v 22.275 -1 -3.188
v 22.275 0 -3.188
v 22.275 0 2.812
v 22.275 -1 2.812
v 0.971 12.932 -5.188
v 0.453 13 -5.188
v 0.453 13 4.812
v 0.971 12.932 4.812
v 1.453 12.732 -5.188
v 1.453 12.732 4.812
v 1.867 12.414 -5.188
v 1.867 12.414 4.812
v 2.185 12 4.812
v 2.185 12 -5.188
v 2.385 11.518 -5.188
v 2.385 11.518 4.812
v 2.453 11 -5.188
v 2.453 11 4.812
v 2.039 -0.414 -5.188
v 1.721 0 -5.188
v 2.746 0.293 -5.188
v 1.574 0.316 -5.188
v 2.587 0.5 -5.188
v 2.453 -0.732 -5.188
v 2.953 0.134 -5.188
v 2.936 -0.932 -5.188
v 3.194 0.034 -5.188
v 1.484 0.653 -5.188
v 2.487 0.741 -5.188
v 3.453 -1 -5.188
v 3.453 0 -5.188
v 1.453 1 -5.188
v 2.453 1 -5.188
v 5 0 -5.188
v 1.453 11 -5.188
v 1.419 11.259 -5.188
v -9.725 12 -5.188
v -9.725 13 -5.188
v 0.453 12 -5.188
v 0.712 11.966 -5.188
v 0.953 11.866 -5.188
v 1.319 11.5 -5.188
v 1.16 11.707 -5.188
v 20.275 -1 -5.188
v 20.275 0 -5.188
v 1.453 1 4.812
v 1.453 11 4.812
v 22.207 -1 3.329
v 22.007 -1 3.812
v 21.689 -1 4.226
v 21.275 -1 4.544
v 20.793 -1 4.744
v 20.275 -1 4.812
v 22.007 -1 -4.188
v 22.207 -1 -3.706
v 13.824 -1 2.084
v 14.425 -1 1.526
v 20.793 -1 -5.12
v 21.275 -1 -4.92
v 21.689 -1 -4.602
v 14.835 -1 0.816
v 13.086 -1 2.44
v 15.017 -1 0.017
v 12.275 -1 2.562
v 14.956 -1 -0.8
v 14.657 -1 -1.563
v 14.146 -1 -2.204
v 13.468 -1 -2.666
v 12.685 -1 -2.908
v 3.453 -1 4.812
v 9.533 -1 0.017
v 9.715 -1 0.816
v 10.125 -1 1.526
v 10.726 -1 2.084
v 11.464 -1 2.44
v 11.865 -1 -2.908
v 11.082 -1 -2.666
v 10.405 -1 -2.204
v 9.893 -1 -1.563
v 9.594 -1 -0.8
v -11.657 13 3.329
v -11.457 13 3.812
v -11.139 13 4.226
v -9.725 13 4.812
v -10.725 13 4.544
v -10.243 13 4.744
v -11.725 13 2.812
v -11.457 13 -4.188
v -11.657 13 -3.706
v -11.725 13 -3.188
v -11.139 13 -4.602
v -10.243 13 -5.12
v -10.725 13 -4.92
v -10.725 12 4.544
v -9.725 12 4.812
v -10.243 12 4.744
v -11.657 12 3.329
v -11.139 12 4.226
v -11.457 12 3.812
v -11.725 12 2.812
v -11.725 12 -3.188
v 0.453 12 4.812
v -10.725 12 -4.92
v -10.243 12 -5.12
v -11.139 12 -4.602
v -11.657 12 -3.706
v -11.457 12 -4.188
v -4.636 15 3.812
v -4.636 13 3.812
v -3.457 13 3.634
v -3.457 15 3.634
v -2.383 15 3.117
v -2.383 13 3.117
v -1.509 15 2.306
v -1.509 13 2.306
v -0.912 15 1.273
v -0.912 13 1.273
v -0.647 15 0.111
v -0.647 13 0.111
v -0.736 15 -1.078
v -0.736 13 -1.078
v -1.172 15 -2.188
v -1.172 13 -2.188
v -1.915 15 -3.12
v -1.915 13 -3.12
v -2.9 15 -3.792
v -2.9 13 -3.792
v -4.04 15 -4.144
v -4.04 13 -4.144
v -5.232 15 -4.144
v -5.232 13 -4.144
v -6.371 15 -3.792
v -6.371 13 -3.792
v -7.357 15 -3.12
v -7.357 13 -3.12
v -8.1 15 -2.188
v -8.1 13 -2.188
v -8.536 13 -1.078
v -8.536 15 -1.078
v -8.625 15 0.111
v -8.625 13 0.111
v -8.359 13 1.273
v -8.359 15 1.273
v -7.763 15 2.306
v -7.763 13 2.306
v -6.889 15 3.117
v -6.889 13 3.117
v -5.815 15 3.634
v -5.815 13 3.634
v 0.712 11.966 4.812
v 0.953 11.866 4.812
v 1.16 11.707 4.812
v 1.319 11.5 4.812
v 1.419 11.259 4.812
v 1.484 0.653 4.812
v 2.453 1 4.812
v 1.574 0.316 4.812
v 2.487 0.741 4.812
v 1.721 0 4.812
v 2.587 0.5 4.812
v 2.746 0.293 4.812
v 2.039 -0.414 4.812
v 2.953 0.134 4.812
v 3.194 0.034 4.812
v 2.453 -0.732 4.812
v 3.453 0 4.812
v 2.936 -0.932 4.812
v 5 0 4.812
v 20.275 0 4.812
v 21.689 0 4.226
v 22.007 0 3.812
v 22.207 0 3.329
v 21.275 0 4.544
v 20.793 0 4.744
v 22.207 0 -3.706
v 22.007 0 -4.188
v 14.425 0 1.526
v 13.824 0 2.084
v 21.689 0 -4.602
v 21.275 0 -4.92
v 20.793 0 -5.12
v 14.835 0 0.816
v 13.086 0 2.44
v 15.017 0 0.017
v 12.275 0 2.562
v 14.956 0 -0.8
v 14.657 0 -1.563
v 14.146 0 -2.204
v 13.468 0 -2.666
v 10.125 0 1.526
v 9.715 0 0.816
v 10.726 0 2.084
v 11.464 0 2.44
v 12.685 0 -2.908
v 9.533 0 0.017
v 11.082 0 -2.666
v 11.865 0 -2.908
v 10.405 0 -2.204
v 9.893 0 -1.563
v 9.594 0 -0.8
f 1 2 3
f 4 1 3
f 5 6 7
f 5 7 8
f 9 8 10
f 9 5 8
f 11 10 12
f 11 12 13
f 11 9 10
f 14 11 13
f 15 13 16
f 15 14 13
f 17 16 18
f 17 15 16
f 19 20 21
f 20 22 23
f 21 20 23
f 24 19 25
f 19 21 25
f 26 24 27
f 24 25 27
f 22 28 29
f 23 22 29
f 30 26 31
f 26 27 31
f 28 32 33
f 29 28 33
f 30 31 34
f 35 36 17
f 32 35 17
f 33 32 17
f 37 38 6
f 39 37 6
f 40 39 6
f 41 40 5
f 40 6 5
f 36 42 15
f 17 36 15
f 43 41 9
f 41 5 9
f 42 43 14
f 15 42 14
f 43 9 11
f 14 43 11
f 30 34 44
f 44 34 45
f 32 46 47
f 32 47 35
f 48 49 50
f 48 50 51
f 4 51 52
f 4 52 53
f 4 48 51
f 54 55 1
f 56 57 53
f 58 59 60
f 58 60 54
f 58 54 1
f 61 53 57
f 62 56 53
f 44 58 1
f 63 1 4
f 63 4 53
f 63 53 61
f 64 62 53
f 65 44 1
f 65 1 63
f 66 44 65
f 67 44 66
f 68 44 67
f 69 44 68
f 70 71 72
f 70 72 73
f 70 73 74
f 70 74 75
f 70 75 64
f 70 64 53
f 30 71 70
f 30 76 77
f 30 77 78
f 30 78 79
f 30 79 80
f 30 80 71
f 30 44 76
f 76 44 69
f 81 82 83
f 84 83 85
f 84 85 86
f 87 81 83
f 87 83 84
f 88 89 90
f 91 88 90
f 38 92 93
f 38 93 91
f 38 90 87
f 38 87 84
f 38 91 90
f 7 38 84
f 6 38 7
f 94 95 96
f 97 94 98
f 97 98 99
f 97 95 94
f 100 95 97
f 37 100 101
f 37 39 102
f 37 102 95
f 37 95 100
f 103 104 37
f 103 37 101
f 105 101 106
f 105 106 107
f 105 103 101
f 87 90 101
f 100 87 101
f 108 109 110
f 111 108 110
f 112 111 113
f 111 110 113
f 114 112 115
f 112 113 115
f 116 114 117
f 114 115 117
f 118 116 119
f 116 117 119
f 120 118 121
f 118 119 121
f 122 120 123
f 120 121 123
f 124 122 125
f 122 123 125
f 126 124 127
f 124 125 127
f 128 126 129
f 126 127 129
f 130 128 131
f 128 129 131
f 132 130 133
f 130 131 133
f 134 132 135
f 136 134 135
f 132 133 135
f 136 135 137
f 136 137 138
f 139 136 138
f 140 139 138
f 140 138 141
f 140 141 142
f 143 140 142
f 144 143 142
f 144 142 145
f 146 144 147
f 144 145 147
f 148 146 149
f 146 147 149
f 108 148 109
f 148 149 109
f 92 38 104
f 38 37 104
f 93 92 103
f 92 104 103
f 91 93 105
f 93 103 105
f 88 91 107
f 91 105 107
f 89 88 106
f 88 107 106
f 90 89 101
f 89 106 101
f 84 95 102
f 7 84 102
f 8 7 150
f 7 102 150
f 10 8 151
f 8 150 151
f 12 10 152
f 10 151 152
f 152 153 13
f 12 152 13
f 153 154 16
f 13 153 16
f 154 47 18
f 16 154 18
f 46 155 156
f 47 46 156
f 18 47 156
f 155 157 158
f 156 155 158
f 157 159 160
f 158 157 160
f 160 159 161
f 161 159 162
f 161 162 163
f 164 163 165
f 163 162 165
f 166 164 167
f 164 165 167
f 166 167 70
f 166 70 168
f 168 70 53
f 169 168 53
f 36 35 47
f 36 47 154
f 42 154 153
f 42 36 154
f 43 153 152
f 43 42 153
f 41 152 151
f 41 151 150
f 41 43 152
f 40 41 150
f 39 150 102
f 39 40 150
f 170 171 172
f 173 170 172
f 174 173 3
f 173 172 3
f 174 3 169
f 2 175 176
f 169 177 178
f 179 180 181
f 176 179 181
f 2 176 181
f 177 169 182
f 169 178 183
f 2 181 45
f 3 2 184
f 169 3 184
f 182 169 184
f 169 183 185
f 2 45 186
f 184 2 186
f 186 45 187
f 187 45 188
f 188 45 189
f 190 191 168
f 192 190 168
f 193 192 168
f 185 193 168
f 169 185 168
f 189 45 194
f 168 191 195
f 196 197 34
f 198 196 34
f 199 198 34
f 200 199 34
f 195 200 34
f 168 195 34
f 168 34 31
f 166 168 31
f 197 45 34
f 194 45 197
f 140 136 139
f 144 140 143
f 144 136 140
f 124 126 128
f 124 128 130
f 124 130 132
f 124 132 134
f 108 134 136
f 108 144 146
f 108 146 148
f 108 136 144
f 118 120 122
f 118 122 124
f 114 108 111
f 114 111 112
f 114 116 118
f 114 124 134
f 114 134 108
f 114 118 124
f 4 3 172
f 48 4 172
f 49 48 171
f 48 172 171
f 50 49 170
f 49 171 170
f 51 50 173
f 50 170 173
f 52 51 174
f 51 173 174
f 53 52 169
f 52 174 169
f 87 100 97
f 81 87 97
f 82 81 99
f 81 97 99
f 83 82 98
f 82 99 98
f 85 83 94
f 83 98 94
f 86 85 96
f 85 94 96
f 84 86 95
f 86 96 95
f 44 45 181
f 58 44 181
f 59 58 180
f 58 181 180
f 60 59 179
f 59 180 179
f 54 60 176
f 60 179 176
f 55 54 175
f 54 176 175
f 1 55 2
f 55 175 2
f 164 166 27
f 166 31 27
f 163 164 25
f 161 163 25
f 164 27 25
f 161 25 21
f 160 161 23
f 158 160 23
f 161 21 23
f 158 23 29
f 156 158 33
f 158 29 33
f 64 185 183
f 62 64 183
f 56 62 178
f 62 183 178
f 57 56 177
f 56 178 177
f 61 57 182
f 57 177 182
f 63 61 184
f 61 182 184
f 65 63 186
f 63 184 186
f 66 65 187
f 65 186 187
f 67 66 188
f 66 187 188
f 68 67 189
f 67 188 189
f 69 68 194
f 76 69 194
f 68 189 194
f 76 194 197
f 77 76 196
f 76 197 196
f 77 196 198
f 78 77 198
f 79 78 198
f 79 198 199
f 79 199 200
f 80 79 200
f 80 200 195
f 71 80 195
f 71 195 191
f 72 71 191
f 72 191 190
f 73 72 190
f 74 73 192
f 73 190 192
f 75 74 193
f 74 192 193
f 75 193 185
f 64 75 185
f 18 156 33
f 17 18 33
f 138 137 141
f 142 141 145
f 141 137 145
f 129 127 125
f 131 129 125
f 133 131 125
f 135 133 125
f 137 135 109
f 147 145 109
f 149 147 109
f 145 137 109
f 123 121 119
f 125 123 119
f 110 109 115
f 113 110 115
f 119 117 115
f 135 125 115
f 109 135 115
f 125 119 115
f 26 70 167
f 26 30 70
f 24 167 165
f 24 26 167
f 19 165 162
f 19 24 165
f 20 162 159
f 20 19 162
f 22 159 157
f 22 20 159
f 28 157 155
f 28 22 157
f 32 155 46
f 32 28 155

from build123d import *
from build123d.topology import SkipClean

# Parameters (mm, degrees)
SKETCH1_R           = 2.75
BASE_FLANGE1_DEPTH  = 1
JOG1_START          = -5.188227046
JOG1_DEPTH          = 10
JOG1_START_2        = -3.188227046
JOG1_2_DEPTH        = 6
JOG1_START_3        = 11
JOG1_3_DEPTH        = 1.974011807
JOG1_4_OUTLINE_W    = 1
JOG1_4_OUTLINE_H    = 2
JOG1_4_DEPTH        = 11.152182036
JOG1_START_4        = 12
JOG1_5_DEPTH        = 1
JOG1_6_DEPTH        = 10
JOG1_7_DEPTH        = 10
SKETCH7_R           = 4
BOSS_EXTRUDE2_DEPTH = 2


with BuildPart() as part:
    # Base-Flange1: sheet metal written as solids
    # Sketch1 → Base-Flange1 (new body)
    with BuildSketch(Plane(origin=(0, 0, 0), x_dir=(1, 0, 0), z_dir=(0, 1, 0))):
        with BuildLine():
            Line((-9.72493422, 5.188227046), (20.27506578, 5.188227046))
            ThreePointArc((20.27506578, 5.188227046), (21.689279343, 4.602440608), (22.27506578, 3.188227046))
            Line((22.27506578, 3.188227046), (22.27506578, -2.811772954))
            ThreePointArc((22.27506578, -2.811772954), (21.689279343, -4.225986516), (20.27506578, -4.811772954))
            Line((20.27506578, -4.811772954), (-9.72493422, -4.811772954))
            ThreePointArc((-9.72493422, -4.811772954), (-11.139147782, -4.225986516), (-11.72493422, -2.811772954))
            Line((-11.72493422, -2.811772954), (-11.72493422, 3.188227046))
            ThreePointArc((-11.72493422, 3.188227046), (-11.139147782, 4.602440608), (-9.72493422, 5.188227046))
        make_face()
        with Locations(Location((12.27506578, 0.188227046, 0), (0, 0, 270))):
            Circle(SKETCH1_R, mode=Mode.SUBTRACT)
    extrude(amount=-BASE_FLANGE1_DEPTH)

    # Jog1: read off the stored shape, not the designer's step
    # Jog1 outline → Jog1 (cut)
    with BuildSketch(Plane.XY.offset(JOG1_START)):
        with BuildLine():
            ThreePointArc((3.453163025, -1), (2.453163025, -0.732050807), (1.721112218, 0))
            Line((1.721112218, 0), (-11.72493422, 0))
            Line((-11.72493422, 0), (-11.72493422, -1))
            Line((-11.72493422, -1), (3.453163025, -1))
        make_face()
    extrude(amount=JOG1_DEPTH, mode=Mode.SUBTRACT)

    # Jog1 2 outline → Jog1 2 (add)
    with BuildSketch(Plane.XY.offset(JOG1_START_2)):
        with BuildLine():
            Line((1.453163025, 11), (1.453163025, 1))
            ThreePointArc((1.453163025, 1), (1.521311373, 0.48236191), (1.721112218, 0))
            Line((1.721112218, 0), (3.453163025, 0))
            ThreePointArc((3.453163025, 0), (2.746056244, 0.292893219), (2.453163025, 1))
            Line((2.453163025, 1), (2.453163025, 11))
            ThreePointArc((2.453163025, 11), (1.867376588, 12.414213563), (0.453163025, 13))
            Line((0.453163025, 13), (-11.72493422, 13))
            Line((-11.72493422, 13), (-11.72493422, 12))
            Line((-11.72493422, 12), (0.453163025, 12))
            ThreePointArc((0.453163025, 12), (1.160269807, 11.707106782), (1.453163025, 11))
        make_face()
    extrude(amount=JOG1_2_DEPTH)

    # Jog1 3 outline → Jog1 3 (add)
    with BuildSketch(Plane(origin=(0, 0, 0), x_dir=(1, 0, 0), z_dir=(0, 1, 0)).offset(JOG1_START_3)):
        with BuildLine():
            Line((2.453163025, -4.811772954), (2.453163025, -2.811772954))
            Line((2.453163025, -2.811772954), (-11.72493422, -2.811772954))
            ThreePointArc((-11.72493422, -2.811772954), (-11.139147782, -4.225986516), (-9.72493422, -4.811772954))
            Line((-9.72493422, -4.811772954), (2.453163025, -4.811772954))
        make_face()
        with BuildLine():
            Line((-11.72493422, 3.188227046), (2.453163025, 3.188227046))
            Line((2.453163025, 3.188227046), (2.453163025, 5.188227046))
            Line((2.453163025, 5.188227046), (-9.72493422, 5.188227046))
            ThreePointArc((-9.72493422, 5.188227046), (-11.139147782, 4.602440608), (-11.72493422, 3.188227046))
        make_face()
    extrude(amount=JOG1_3_DEPTH)

    # Jog1 4 outline → Jog1 4 (add)
    with BuildSketch(Plane(origin=(0, 0, 0), x_dir=(1, 0, 0), z_dir=(0, 1, 0))):
        with Locations((1.953163025, -3.811772954)):
            Rectangle(JOG1_4_OUTLINE_W, JOG1_4_OUTLINE_H)
        with Locations((1.953163025, 4.188227046)):
            Rectangle(JOG1_4_OUTLINE_W, JOG1_4_OUTLINE_H)
    extrude(amount=JOG1_4_DEPTH)

    # Jog1 5 outline → Jog1 5 (add)
    with BuildSketch(Plane(origin=(0, 0, 0), x_dir=(1, 0, 0), z_dir=(0, 1, 0)).offset(JOG1_START_4)):
        with BuildLine():
            Line((-9.72493422, -4.811772954), (1.453163025, -4.811772954))
            Line((1.453163025, -4.811772954), (1.453163025, -2.811772954))
            Line((1.453163025, -2.811772954), (-11.72493422, -2.811772954))
            ThreePointArc((-11.72493422, -2.811772954), (-11.139147782, -4.225986516), (-9.72493422, -4.811772954))
        make_face()
        with BuildLine():
            Line((-11.72493422, 3.188227046), (1.453163025, 3.188227046))
            Line((1.453163025, 3.188227046), (1.453163025, 5.188227046))
            Line((1.453163025, 5.188227046), (-9.72493422, 5.188227046))
            ThreePointArc((-9.72493422, 5.188227046), (-11.139147782, 4.602440608), (-11.72493422, 3.188227046))
        make_face()
    extrude(amount=JOG1_5_DEPTH)

    # Jog1 6 outline → Jog1 6 (cut)
    with SkipClean():  # the faces are left unmerged after this step: merging them gives an invalid solid
        with BuildSketch(Plane.XY.offset(JOG1_START)):
            with BuildLine():
                ThreePointArc((2.453163024, -0.732050806), (2.038949462, -0.414213561), (1.721112218, 0))
                ThreePointArc((1.721112218, 0), (1.521311373, 0.48236191), (1.453163025, 1))
                Line((1.453163025, 1), (1.453163025, 11))
                ThreePointArc((1.453163025, 11), (1.160269807, 11.707106782), (0.453163025, 12))
                Line((0.453163025, 12), (-13, 12))
                Line((-13, 12), (-13, -2))
                Line((-13, -2), (2.453163024, -2))
                Line((2.453163024, -2), (2.453163024, -0.732050806))
            make_face()
            with BuildLine():
                Line((2.453163025, 12.974011807), (1.453163025, 12.974011807))
                Line((1.453163025, 12.974011807), (1.453163025, 13))
                Line((1.453163025, 13), (1.453163017, 14))
                Line((1.453163017, 14), (-13, 14))
                Line((-13, 14), (-13, 12.999999997))
                Line((-13, 12.999999997), (0.453163025, 13))
                ThreePointArc((0.453163025, 13), (1.867376588, 12.414213563), (2.453163025, 11))
                Line((2.453163025, 11), (2.453163025, 12.974011807))
            make_face()
        extrude(amount=JOG1_6_DEPTH, mode=Mode.SUBTRACT)
    add(part.part.scale(1), mode=Mode.REPLACE)  # the faces are merged on a copy

    # Jog1 7 outline → Jog1 7 (add)
    with SkipClean():  # the faces are left unmerged after this step: merging them gives an invalid solid
        with BuildSketch(Plane.XY.offset(JOG1_START)):
            with BuildLine():
                Line((2.453163022, 0), (2.453163024, -0.732050806))
                ThreePointArc((2.453163024, -0.732050806), (2.935524934, -0.931851652), (3.453163025, -1))
                Line((3.453163025, -1), (5, -1.000000001))
                Line((5, -1.000000001), (5, -1e-09))
                Line((5, -1e-09), (3.453163025, 0))
                ThreePointArc((3.453163025, 0), (2.746056244, 0.292893219), (2.453163025, 1))
                Line((2.453163025, 1), (2.453163022, 0))
            make_face()
        extrude(amount=JOG1_7_DEPTH)
    add(part.part.scale(1), mode=Mode.REPLACE)  # the faces are merged on a copy


with BuildPart() as body_2:
    # Sketch7 → Boss-Extrude2 (new body)
    with BuildSketch(Plane(origin=(0, 13, 0), x_dir=(1, 0, 0), z_dir=(0, 1, 0))):
        with Locations(Location((-4.635885597, 0.188227046, 0), (0, 0, 270))):
            Circle(SKETCH7_R)
    extrude(amount=BOSS_EXTRUDE2_DEPTH)


solid = Compound([part.part, body_2.part])
